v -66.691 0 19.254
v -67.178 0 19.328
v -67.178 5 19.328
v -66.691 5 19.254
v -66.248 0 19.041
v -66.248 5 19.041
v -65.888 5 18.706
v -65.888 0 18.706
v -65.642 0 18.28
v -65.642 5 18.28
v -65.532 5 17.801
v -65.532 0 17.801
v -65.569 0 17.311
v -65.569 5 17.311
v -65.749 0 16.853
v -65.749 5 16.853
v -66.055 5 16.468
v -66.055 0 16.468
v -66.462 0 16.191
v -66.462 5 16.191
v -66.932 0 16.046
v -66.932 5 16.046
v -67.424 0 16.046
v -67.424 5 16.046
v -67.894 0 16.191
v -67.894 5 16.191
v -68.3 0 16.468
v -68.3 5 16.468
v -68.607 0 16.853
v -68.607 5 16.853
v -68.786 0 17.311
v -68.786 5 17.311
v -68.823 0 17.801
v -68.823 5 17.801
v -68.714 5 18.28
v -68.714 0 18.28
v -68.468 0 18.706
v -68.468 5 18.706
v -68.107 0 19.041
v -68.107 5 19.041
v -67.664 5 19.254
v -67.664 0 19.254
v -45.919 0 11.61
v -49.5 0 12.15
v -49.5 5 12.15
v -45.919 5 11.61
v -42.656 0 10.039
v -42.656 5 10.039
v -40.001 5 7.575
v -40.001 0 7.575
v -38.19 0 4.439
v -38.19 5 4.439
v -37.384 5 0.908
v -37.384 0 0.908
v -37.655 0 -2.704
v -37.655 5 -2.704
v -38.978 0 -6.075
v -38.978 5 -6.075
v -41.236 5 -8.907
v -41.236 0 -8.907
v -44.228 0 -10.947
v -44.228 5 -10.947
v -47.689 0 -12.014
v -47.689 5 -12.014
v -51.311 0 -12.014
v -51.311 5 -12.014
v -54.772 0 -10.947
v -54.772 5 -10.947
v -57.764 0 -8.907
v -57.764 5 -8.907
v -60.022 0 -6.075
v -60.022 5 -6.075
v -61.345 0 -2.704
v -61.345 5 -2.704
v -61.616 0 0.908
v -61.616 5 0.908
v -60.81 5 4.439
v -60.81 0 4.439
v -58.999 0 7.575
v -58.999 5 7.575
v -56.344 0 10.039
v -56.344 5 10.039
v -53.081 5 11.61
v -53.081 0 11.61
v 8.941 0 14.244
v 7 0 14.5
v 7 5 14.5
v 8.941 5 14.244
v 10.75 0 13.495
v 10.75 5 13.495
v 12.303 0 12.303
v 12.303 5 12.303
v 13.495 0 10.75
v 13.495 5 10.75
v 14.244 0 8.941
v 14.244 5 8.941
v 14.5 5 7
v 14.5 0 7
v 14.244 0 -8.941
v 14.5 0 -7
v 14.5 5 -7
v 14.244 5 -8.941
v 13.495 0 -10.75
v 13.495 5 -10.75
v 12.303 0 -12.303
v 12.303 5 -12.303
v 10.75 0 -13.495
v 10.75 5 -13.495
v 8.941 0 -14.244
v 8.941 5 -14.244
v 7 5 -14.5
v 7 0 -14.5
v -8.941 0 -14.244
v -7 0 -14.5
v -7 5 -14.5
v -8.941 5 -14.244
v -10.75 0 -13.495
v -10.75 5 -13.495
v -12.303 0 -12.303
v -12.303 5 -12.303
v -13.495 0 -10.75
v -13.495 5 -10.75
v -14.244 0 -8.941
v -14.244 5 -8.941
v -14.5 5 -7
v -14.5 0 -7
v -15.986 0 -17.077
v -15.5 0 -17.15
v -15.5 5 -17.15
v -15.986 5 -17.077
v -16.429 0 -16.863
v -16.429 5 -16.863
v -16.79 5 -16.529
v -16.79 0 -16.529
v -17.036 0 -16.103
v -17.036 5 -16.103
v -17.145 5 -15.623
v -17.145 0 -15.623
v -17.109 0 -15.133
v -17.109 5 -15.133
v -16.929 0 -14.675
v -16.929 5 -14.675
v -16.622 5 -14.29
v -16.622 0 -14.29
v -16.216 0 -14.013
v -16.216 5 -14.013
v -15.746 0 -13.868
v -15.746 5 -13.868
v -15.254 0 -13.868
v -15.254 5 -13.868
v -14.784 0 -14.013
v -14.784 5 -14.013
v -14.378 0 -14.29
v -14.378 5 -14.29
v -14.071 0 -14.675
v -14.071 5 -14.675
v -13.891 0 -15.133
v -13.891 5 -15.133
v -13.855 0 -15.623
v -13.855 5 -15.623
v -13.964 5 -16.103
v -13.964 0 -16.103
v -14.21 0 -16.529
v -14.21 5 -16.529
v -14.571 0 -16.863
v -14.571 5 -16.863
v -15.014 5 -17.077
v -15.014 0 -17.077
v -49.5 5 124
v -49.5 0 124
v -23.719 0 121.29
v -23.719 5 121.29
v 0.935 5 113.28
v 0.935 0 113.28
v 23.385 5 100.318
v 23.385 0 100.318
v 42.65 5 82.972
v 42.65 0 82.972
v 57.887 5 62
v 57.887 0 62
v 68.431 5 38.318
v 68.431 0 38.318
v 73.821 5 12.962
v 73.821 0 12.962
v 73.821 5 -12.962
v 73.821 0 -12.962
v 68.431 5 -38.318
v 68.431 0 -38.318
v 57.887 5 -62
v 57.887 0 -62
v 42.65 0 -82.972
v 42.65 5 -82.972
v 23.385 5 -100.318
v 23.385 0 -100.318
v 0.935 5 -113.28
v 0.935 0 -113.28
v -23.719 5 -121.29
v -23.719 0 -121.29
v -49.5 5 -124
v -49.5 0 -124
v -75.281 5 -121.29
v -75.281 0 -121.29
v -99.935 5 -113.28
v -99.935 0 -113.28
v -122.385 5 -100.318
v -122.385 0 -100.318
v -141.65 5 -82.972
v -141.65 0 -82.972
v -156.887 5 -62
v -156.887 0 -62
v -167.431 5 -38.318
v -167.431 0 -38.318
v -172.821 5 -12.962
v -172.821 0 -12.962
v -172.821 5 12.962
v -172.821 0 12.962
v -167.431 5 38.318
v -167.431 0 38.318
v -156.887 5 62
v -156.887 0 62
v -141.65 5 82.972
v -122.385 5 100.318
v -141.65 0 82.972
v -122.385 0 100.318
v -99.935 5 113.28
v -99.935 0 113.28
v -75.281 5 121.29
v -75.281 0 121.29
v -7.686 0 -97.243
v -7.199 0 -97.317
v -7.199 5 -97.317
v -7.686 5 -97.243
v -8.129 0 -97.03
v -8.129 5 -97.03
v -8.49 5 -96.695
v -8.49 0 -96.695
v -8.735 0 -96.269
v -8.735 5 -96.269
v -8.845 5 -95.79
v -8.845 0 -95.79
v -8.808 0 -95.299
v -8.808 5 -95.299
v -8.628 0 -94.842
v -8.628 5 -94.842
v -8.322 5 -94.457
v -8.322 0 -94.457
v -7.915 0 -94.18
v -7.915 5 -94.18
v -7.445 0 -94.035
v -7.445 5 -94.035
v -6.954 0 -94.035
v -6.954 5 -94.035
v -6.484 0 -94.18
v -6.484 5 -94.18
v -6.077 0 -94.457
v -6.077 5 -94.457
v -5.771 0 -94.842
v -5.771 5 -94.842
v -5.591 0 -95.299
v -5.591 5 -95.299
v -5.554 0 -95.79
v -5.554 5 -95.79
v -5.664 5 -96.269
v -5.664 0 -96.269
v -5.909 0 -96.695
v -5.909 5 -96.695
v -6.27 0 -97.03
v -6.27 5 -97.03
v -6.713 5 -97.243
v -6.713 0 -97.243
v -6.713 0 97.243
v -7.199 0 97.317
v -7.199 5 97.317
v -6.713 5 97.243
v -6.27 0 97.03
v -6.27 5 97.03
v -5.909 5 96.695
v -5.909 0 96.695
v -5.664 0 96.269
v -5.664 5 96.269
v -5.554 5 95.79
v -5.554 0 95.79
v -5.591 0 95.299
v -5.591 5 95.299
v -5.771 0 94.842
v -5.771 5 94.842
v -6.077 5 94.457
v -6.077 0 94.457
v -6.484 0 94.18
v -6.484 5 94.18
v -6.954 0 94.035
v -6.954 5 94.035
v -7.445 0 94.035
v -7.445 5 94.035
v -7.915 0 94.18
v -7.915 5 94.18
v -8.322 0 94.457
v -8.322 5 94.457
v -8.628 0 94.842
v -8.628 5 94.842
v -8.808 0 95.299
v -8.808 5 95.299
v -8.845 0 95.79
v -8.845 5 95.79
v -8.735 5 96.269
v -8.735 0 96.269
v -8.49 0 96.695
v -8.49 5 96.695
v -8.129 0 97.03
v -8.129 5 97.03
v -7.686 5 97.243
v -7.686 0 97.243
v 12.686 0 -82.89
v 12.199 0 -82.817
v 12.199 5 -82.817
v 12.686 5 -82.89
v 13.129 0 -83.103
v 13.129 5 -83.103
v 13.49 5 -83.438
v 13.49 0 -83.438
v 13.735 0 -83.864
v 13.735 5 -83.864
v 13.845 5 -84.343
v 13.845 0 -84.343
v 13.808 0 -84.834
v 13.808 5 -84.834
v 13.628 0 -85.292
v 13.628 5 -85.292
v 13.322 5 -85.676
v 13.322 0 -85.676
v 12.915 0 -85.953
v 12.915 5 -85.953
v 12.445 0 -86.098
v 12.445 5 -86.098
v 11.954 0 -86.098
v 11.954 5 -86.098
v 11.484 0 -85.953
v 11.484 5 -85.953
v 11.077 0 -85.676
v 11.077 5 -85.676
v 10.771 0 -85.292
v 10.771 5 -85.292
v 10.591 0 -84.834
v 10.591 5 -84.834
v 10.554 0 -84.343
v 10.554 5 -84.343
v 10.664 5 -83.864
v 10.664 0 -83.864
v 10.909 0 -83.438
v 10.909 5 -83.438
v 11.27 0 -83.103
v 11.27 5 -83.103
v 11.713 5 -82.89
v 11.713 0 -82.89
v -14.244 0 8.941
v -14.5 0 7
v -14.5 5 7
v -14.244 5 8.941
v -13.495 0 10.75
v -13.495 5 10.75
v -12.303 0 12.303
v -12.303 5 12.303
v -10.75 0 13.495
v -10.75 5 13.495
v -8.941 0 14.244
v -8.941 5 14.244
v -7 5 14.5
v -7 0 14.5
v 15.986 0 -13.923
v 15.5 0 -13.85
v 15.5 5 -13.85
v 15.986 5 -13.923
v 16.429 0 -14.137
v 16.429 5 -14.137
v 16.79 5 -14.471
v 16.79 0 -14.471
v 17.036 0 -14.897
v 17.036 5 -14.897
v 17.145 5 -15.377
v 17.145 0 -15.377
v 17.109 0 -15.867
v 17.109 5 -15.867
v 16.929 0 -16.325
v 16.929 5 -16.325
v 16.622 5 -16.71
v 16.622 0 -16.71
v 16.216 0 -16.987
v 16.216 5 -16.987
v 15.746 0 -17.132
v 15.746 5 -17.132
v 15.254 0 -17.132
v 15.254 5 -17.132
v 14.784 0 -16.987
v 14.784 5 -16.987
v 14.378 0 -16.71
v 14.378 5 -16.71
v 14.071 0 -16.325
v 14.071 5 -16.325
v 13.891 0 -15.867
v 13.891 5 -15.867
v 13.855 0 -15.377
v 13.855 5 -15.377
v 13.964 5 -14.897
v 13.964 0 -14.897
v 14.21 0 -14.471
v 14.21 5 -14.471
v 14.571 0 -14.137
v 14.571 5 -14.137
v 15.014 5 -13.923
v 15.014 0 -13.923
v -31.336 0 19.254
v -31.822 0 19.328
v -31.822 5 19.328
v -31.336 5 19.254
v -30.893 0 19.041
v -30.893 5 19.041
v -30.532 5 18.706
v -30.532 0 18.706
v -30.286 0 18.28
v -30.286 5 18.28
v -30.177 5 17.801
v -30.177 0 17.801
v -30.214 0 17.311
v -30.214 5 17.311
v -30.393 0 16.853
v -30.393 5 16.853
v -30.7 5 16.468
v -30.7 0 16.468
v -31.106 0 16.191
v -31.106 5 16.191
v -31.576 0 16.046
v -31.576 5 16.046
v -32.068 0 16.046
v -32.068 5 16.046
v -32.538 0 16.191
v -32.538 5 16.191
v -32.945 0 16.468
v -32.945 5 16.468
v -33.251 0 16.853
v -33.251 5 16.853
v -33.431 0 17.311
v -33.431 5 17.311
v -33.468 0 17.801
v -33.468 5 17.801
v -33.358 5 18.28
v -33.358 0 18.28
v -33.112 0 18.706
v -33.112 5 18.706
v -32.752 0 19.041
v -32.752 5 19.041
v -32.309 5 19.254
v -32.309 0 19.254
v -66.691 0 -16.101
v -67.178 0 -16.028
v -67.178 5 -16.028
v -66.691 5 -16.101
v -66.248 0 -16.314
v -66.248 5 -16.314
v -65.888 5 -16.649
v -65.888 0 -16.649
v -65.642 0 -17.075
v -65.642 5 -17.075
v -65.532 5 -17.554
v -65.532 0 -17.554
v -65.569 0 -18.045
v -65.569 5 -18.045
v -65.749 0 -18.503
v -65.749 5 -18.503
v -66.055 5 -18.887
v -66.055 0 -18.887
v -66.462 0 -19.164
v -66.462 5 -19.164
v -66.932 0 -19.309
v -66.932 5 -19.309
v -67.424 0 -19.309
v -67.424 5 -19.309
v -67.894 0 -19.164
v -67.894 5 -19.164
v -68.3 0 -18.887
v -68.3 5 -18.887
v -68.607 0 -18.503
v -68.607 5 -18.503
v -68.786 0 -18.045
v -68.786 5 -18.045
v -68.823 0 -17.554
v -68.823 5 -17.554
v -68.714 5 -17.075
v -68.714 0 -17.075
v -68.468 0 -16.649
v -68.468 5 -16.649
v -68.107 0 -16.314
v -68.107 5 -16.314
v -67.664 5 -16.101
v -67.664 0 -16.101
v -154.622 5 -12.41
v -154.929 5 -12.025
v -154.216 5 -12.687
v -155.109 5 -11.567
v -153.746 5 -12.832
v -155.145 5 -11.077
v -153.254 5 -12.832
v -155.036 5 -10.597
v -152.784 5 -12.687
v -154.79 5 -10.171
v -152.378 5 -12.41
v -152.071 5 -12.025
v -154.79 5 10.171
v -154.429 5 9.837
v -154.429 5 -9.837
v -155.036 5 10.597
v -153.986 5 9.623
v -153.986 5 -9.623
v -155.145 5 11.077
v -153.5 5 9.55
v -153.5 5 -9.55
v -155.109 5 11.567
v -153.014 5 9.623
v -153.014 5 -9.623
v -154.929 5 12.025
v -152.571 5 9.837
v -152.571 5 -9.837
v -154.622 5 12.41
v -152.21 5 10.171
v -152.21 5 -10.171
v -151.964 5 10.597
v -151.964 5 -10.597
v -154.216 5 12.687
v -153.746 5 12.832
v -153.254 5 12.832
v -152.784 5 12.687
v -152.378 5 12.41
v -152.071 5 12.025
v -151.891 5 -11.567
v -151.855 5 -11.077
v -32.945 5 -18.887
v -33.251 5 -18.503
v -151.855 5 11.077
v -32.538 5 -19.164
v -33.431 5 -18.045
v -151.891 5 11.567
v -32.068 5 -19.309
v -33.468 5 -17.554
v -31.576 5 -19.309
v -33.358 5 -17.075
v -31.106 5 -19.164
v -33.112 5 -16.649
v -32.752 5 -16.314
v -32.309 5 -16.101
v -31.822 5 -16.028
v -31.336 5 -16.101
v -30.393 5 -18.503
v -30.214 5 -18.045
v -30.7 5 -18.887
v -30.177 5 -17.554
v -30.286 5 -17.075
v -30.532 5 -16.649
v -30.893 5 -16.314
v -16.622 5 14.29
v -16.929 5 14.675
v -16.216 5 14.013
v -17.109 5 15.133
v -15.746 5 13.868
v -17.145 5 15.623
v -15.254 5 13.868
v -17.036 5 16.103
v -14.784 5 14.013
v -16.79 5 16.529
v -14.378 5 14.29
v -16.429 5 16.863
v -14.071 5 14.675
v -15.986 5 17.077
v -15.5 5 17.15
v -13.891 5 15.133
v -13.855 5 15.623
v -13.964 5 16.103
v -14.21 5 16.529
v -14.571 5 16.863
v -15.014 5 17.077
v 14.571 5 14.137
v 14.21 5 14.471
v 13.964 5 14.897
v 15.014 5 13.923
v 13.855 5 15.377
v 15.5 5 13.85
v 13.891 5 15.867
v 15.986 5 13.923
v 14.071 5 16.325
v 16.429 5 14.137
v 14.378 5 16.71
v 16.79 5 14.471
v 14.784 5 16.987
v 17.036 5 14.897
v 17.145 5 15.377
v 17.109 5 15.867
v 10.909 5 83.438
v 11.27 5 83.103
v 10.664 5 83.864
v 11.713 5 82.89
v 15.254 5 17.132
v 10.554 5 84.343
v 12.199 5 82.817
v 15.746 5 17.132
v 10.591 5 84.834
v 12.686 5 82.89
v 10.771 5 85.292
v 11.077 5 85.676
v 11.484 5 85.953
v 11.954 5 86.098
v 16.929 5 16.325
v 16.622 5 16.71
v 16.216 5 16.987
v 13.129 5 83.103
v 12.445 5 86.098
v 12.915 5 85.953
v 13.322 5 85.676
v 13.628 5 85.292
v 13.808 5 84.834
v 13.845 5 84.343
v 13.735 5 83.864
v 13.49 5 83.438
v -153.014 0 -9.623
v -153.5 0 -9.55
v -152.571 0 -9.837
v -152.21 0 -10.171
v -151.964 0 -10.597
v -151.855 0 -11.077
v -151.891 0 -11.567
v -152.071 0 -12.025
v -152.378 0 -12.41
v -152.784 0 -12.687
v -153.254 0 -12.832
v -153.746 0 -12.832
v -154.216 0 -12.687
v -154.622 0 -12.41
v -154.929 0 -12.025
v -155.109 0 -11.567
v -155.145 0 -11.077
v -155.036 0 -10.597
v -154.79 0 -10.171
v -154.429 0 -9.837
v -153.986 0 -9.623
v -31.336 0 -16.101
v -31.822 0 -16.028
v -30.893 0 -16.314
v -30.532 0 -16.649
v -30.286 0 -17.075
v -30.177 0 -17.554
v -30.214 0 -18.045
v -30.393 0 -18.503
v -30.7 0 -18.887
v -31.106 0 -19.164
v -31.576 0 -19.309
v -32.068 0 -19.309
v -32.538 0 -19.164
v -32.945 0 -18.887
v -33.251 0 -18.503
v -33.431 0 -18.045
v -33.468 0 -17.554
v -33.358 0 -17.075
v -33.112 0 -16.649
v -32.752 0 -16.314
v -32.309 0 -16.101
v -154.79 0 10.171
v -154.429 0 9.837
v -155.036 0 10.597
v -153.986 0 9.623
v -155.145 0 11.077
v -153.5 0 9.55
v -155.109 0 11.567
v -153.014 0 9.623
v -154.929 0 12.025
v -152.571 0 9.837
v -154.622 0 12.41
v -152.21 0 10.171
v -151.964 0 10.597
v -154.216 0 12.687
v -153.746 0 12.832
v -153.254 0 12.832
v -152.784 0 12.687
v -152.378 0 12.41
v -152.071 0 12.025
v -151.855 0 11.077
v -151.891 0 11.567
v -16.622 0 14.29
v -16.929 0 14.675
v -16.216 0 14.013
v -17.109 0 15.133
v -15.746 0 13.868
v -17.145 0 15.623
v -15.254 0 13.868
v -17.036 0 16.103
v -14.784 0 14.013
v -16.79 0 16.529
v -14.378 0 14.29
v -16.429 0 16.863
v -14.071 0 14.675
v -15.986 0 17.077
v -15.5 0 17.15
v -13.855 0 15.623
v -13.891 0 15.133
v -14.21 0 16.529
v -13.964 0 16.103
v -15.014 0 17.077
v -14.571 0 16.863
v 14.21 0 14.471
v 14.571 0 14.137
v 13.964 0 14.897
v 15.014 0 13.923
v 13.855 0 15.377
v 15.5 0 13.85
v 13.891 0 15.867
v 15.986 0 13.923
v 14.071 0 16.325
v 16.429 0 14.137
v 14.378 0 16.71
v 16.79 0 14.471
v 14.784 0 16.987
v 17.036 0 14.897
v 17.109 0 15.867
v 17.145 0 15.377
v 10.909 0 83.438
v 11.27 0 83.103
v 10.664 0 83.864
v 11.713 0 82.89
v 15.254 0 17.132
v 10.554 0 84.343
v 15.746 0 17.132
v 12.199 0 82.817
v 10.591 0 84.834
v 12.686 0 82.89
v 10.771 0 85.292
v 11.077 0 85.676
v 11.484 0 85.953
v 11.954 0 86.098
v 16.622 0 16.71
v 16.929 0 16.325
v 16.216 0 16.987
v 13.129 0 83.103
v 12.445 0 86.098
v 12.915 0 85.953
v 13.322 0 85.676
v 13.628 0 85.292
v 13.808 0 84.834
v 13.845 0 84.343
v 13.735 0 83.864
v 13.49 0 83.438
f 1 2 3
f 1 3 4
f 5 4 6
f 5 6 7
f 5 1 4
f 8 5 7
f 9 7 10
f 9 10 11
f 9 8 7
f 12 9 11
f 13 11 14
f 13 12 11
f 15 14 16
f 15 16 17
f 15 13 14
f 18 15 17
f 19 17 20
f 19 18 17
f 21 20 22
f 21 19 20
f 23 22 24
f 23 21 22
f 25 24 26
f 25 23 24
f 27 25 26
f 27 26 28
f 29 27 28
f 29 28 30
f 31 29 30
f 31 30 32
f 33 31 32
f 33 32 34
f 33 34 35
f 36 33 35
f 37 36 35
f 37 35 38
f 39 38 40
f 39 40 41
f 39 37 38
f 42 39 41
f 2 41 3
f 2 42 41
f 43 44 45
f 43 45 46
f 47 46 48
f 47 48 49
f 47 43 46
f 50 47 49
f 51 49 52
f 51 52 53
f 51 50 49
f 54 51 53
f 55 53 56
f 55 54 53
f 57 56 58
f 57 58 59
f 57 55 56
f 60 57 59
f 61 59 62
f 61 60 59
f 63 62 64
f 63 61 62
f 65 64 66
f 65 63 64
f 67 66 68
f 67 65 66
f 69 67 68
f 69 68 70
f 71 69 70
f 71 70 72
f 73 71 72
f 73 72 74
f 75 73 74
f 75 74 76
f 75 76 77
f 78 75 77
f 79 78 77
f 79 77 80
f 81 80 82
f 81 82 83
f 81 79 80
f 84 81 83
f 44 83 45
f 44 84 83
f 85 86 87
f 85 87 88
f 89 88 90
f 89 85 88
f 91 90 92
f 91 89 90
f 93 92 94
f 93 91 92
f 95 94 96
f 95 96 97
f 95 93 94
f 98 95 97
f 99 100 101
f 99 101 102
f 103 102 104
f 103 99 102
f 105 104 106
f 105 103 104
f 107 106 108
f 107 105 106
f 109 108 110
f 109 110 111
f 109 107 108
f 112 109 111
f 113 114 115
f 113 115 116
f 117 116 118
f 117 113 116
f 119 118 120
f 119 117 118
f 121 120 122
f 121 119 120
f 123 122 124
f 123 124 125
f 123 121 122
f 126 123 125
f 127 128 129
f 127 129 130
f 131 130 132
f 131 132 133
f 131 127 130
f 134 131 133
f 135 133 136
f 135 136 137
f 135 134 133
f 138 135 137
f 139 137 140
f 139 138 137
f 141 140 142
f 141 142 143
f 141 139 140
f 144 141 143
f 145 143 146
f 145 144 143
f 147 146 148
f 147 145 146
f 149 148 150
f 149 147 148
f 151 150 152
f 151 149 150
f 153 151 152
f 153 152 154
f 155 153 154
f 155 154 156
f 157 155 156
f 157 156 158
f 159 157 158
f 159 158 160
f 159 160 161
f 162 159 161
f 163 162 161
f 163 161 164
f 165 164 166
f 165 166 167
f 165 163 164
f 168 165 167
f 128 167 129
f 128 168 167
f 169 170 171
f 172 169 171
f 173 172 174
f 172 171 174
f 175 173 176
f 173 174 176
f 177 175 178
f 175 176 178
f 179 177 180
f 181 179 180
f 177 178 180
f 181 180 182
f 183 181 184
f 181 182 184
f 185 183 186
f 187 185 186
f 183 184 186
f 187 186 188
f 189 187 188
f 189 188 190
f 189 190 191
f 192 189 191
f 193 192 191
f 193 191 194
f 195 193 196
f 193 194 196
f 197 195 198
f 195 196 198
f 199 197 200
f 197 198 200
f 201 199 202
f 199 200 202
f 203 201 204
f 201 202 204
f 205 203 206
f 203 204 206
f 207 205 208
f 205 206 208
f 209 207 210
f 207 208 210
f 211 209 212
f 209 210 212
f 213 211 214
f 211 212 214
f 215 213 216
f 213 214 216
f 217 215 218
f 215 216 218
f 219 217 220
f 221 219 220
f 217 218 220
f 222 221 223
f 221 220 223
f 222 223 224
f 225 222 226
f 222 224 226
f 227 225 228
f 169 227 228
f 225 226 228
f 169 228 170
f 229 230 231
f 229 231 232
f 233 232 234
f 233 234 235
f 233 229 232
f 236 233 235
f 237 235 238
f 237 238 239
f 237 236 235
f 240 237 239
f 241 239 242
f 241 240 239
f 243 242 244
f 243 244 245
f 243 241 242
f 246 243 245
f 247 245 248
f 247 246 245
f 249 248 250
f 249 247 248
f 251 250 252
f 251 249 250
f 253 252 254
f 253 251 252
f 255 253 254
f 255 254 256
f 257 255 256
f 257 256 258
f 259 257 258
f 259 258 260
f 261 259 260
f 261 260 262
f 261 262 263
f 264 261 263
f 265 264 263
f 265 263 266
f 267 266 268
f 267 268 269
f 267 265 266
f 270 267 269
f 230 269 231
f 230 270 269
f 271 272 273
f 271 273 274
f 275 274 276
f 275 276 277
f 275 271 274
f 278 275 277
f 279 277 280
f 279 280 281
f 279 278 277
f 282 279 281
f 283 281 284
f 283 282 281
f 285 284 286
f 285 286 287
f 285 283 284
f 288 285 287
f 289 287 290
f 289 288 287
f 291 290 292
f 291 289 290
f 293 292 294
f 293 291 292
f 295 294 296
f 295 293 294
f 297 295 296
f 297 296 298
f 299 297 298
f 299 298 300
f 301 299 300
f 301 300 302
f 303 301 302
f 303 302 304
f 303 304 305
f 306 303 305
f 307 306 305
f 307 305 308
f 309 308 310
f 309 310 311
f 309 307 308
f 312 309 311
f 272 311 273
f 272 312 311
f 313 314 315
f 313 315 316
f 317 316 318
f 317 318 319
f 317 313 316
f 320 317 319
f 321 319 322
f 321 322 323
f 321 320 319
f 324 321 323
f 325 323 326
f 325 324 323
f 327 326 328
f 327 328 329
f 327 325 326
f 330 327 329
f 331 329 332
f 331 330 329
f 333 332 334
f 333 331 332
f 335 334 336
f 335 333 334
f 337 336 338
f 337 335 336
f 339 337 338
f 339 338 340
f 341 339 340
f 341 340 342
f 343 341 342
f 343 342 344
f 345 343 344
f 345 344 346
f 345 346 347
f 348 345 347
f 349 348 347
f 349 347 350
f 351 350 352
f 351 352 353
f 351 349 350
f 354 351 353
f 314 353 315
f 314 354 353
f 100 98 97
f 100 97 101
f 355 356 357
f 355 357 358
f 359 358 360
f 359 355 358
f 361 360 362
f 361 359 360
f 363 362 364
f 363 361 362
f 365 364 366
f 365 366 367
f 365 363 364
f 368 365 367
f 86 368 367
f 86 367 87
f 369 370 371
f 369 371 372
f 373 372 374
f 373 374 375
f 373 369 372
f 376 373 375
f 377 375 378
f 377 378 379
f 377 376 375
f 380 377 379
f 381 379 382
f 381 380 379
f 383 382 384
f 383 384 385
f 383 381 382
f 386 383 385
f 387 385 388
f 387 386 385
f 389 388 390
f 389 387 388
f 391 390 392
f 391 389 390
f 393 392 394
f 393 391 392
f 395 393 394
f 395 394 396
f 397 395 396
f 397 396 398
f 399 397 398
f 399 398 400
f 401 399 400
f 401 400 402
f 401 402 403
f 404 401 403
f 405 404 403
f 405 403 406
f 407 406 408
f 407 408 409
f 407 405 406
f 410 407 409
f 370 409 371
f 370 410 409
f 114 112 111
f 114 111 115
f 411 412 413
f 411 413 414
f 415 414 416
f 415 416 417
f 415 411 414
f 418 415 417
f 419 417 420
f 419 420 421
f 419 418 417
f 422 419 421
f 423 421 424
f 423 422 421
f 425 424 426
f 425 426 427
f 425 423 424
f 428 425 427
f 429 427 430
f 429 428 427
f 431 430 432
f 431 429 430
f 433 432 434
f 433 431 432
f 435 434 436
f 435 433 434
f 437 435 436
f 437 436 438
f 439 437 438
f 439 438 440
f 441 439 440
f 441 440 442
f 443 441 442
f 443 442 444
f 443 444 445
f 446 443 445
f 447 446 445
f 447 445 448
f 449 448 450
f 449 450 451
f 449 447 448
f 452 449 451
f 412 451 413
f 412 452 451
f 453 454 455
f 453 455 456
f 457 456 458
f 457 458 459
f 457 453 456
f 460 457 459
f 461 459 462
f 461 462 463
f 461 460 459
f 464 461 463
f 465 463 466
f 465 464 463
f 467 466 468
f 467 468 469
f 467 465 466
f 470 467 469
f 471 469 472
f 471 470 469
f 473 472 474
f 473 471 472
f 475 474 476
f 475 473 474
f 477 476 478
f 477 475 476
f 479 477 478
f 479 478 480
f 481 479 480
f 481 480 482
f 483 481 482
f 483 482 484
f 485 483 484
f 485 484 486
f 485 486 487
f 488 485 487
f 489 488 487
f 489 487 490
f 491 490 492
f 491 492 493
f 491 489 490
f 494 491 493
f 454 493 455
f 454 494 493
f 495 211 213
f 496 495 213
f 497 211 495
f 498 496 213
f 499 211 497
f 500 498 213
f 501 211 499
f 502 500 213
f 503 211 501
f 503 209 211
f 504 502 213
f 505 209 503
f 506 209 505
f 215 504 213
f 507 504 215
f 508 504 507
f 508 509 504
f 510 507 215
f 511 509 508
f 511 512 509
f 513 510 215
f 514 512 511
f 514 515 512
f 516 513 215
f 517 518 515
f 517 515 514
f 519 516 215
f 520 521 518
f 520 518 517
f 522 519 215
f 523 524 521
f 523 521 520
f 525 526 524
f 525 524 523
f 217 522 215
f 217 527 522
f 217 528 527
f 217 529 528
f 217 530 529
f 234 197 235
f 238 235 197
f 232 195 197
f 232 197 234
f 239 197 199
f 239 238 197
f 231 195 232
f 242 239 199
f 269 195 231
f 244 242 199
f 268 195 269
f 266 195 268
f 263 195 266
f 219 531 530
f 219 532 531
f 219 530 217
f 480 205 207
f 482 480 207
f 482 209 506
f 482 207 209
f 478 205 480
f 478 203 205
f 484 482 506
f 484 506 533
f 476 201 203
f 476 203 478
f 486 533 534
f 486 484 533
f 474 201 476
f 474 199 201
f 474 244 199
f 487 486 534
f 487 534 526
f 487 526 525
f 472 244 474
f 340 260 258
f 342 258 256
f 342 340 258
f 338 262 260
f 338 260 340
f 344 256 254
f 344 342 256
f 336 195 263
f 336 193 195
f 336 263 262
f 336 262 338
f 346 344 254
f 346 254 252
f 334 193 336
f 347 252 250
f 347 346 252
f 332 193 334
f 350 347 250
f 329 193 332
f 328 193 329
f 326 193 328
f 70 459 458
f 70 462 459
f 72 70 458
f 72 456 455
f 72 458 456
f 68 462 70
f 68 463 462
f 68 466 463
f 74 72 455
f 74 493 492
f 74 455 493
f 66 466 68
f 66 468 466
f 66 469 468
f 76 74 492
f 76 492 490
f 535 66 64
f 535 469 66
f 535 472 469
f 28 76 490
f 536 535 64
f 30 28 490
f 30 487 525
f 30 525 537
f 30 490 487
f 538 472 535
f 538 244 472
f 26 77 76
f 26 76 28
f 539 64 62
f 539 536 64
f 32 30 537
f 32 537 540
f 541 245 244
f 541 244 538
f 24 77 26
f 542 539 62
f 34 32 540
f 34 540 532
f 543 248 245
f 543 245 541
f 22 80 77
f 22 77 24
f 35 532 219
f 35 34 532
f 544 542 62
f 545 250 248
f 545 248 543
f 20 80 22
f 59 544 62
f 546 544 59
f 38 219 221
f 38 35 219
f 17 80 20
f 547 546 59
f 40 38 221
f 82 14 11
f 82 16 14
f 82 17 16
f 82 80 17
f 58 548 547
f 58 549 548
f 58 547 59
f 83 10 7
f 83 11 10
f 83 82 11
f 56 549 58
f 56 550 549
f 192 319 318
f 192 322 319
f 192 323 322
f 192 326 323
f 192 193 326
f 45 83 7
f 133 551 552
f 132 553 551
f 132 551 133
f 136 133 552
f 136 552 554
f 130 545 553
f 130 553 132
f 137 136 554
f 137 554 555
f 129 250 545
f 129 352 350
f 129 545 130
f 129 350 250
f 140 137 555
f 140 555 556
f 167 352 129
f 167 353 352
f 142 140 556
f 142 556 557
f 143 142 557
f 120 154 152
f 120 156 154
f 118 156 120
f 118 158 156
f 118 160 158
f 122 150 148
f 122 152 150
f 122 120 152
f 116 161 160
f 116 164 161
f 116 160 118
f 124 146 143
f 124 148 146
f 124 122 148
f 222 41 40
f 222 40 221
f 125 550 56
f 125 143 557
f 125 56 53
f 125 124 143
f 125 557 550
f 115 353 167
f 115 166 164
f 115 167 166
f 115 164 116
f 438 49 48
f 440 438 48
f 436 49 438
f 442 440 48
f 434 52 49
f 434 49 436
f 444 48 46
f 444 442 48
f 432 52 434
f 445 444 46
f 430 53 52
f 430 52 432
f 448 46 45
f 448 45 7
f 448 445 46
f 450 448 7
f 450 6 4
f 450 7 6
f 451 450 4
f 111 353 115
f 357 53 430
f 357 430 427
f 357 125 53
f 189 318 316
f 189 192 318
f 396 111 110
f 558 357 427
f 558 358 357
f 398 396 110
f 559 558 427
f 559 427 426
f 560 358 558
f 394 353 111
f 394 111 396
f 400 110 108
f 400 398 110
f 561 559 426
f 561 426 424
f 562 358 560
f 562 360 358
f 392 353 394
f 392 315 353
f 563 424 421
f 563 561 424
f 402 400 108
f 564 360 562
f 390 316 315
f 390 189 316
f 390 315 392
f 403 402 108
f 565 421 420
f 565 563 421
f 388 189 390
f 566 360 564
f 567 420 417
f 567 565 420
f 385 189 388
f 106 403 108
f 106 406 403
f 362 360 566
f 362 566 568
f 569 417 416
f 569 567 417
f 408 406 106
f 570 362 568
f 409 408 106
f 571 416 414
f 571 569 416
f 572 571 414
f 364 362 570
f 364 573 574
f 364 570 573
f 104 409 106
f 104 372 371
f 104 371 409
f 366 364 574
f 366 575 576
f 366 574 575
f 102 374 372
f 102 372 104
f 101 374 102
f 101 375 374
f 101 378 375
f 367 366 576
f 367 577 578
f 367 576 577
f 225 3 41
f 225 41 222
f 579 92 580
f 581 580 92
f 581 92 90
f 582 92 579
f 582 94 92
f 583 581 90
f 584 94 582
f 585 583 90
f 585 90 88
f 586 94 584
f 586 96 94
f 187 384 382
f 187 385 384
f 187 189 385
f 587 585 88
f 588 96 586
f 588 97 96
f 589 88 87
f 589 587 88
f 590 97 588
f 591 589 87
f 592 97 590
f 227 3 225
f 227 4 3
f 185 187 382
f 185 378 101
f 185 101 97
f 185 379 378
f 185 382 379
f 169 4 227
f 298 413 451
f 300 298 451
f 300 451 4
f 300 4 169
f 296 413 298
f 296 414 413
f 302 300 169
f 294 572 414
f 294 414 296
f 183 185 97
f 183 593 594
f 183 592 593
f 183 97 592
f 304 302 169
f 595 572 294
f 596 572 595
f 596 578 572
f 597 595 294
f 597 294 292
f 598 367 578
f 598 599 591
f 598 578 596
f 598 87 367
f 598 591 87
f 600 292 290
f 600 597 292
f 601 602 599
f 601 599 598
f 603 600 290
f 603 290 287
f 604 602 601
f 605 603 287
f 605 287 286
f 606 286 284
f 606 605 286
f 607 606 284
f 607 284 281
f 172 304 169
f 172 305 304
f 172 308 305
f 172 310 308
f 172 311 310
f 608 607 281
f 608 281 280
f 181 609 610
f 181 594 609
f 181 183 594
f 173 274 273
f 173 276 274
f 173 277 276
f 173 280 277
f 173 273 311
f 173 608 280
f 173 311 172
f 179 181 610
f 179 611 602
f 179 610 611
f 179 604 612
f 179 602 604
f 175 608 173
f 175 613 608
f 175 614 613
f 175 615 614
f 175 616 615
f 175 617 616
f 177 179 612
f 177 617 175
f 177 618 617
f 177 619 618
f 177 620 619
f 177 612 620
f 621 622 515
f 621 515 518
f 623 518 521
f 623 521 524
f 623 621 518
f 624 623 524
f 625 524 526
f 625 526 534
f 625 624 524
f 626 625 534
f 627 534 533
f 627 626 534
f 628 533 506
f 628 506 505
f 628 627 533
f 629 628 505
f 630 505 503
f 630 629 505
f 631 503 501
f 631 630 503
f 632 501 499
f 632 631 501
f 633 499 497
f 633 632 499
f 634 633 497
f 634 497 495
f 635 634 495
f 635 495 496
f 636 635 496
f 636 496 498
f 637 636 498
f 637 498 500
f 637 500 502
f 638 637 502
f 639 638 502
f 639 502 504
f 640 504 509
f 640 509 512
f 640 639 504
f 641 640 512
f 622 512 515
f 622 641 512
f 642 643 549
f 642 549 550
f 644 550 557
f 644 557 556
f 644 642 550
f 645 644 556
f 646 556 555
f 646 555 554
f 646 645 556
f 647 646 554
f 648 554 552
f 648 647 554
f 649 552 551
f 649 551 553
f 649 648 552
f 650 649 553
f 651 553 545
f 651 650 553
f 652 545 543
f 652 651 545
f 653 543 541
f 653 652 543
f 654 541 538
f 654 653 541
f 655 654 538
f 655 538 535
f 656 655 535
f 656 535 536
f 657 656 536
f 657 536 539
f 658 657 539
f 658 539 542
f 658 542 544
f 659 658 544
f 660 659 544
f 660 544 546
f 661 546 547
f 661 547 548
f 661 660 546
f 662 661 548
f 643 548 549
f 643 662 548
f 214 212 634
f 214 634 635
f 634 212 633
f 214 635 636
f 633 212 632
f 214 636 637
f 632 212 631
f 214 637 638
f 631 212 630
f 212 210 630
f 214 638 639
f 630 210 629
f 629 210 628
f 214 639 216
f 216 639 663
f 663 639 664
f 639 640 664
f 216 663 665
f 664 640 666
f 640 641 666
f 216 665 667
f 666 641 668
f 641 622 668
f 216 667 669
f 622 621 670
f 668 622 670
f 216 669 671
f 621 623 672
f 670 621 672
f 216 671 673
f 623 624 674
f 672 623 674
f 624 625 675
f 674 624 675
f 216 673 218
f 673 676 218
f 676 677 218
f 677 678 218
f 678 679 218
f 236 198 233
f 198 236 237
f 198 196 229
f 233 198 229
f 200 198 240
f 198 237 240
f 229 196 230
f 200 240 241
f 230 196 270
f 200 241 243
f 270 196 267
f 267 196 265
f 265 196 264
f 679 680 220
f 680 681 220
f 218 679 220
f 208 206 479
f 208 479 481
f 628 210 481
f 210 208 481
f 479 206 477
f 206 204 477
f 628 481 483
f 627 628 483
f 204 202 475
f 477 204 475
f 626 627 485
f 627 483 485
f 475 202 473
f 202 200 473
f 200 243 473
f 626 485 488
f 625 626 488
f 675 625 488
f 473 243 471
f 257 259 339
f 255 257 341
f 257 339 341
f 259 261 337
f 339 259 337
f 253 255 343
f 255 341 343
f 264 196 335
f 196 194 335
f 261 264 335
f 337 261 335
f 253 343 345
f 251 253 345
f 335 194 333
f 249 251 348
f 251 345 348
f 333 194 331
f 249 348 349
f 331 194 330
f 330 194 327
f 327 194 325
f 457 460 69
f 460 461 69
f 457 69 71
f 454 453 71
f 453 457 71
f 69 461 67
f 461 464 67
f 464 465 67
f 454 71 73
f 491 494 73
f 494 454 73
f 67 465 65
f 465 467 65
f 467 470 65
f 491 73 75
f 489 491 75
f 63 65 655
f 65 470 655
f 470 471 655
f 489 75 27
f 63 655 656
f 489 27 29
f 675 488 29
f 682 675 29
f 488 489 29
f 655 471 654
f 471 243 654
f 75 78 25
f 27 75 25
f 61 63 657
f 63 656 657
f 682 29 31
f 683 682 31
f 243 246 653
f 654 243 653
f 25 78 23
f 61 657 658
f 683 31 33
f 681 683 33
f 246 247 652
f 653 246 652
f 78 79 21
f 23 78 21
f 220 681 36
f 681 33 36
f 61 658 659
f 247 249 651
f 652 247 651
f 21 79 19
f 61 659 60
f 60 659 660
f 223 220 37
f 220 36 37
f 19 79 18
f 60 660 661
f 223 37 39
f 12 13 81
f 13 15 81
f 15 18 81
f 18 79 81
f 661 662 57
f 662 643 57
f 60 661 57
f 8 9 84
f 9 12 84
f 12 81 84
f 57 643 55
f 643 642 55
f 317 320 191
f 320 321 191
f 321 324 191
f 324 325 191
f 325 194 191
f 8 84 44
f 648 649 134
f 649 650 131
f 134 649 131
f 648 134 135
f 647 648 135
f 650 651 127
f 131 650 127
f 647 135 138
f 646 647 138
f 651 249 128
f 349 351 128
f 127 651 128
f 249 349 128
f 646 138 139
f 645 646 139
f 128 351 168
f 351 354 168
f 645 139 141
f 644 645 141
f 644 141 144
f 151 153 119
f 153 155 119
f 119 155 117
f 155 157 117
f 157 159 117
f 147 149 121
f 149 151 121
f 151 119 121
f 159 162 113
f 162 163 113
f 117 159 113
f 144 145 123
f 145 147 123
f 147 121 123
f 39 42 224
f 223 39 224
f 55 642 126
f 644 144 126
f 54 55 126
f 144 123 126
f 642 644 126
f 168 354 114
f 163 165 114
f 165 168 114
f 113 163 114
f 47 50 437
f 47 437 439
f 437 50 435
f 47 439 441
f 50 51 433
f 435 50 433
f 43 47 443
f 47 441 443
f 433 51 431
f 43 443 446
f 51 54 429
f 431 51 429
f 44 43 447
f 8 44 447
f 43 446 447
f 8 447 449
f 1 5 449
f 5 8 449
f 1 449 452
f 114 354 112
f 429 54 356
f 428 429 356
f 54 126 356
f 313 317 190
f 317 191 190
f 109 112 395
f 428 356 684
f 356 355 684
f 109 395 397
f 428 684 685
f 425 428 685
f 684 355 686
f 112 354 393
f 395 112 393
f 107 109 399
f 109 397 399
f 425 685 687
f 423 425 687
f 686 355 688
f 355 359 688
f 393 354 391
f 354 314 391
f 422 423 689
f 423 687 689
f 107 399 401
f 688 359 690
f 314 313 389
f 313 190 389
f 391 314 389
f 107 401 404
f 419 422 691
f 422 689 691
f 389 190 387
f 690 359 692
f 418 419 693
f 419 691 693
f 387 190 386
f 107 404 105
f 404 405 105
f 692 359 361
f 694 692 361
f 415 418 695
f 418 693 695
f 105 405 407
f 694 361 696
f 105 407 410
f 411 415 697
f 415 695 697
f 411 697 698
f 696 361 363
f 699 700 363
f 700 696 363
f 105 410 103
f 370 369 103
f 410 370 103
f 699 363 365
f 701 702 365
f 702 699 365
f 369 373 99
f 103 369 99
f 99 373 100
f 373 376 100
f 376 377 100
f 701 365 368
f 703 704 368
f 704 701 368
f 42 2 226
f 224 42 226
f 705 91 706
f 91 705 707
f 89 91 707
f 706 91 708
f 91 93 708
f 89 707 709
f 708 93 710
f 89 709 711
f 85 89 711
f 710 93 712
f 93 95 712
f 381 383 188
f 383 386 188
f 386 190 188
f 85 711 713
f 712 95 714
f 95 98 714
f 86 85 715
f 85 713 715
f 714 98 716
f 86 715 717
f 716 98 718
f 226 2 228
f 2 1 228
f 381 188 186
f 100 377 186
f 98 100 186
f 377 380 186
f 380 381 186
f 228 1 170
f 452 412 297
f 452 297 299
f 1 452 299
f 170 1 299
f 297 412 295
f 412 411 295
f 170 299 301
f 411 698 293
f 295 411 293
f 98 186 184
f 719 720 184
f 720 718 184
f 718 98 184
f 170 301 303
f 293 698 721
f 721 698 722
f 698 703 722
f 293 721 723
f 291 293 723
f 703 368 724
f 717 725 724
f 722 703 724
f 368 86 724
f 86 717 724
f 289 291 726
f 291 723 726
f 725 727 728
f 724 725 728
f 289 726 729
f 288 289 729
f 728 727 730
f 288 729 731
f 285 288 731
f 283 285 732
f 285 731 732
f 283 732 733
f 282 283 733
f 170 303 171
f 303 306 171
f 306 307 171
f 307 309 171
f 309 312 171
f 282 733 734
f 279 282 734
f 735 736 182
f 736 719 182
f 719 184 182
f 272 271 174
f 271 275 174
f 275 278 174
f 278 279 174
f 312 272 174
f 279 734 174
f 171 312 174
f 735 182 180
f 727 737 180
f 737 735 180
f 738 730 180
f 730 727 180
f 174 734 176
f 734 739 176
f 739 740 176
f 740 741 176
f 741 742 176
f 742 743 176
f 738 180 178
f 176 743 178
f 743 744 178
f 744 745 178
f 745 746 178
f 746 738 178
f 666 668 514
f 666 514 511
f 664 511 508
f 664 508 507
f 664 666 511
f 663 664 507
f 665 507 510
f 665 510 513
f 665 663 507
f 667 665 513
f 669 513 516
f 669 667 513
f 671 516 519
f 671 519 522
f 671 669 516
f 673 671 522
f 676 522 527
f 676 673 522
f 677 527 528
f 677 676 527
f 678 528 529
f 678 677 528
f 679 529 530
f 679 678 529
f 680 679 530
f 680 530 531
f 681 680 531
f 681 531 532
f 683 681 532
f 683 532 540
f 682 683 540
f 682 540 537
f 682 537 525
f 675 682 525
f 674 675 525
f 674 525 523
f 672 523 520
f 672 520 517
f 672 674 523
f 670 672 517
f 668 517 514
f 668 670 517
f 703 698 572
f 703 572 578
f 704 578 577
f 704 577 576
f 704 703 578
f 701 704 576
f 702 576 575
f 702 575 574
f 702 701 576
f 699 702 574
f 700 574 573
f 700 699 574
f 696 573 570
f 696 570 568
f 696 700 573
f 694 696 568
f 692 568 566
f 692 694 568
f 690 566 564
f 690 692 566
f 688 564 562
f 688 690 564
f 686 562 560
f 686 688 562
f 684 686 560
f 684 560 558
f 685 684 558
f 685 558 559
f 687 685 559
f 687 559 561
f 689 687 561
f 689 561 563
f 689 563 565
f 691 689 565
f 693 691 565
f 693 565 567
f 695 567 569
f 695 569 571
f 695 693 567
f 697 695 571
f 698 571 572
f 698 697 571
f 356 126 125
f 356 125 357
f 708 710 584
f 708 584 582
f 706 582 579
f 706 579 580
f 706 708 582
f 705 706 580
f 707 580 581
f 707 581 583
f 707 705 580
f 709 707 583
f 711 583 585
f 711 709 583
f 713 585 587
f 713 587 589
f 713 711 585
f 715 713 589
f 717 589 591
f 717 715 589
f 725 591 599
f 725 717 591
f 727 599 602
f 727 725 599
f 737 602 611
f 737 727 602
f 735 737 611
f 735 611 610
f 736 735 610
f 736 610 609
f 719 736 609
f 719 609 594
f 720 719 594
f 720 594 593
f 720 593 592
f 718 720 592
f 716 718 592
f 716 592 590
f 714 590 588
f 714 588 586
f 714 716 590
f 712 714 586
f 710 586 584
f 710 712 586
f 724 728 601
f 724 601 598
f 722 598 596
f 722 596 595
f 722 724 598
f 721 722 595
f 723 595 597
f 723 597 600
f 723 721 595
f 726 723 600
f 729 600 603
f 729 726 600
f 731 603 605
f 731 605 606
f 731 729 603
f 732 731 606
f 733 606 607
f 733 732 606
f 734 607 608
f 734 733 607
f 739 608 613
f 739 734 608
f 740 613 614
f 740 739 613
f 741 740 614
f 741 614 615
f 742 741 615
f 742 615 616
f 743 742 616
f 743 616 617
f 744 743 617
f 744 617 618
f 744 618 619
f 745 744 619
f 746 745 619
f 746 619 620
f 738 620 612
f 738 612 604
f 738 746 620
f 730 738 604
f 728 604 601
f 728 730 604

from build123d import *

# Parameters (mm, degrees)
LASER_HOLES_R       = 124
LASER_HOLES_R_2     = 1.65
LASER_HOLES_R_3     = 12.15
BOSS_EXTRUDE4_DEPTH = 5


with BuildPart() as part:
    # Laser holes → Boss-Extrude4 (new body)
    with BuildSketch(Plane(origin=(0, 0, 0), x_dir=(1, 0, 0), z_dir=(0, 1, 0))):
        with Locations(Location((-49.5, 0, 0), (0, 0, 270))):
            Circle(LASER_HOLES_R)
        with Locations(Location((15.5, 15.5, 0), (0, 0, 270))):
            Circle(LASER_HOLES_R_2, mode=Mode.SUBTRACT)
        with Locations(Location((-15.5, 15.5, 0), (0, 0, 90))):
            Circle(LASER_HOLES_R_2, mode=Mode.SUBTRACT)
        with Locations(Location((-15.5, -15.5, 0), (0, 0, 270))):
            Circle(LASER_HOLES_R_2, mode=Mode.SUBTRACT)
        with Locations(Location((15.5, -15.5, 0), (0, 0, 90))):
            Circle(LASER_HOLES_R_2, mode=Mode.SUBTRACT)
        with Locations(Location((-31.82233047, 17.67766953, 0), (0, 0, 270))):
            Circle(LASER_HOLES_R_2, mode=Mode.SUBTRACT)
        with Locations(Location((-67.17766953, 17.67766953, 0), (0, 0, 270))):
            Circle(LASER_HOLES_R_2, mode=Mode.SUBTRACT)
        with Locations(Location((-67.17766953, -17.67766953, 0), (0, 0, 270))):
            Circle(LASER_HOLES_R_2, mode=Mode.SUBTRACT)
        with Locations(Location((-31.82233047, -17.67766953, 0), (0, 0, 270))):
            Circle(LASER_HOLES_R_2, mode=Mode.SUBTRACT)
        with Locations(Location((-49.5, 0, 0), (0, 0, 270))):
            Circle(LASER_HOLES_R_3, mode=Mode.SUBTRACT)
        with Locations(Location((-153.5, 11.2, 0), (0, 0, 270))):
            Circle(LASER_HOLES_R_2, mode=Mode.SUBTRACT)
        with Locations(Location((-153.5, -11.2, 0), (0, 0, 90))):
            Circle(LASER_HOLES_R_2, mode=Mode.SUBTRACT)
        with Locations(Location((-7.199484522, 95.666641994, 0), (0, 0, 90))):
            Circle(LASER_HOLES_R_2, mode=Mode.SUBTRACT)
        with Locations(Location((12.199484522, 84.466641994, 0), (0, 0, 270))):
            Circle(LASER_HOLES_R_2, mode=Mode.SUBTRACT)
        with Locations(Location((12.199484522, -84.466641994, 0), (0, 0, 90))):
            Circle(LASER_HOLES_R_2, mode=Mode.SUBTRACT)
        with Locations(Location((-7.199484522, -95.666641994, 0), (0, 0, 270))):
            Circle(LASER_HOLES_R_2, mode=Mode.SUBTRACT)
        with BuildLine():
            Line((14.5, -7), (14.5, 7))
            ThreePointArc((14.5, 7), (12.303300859, 12.303300859), (7, 14.5))
            Line((7, 14.5), (-7, 14.5))
            ThreePointArc((-7, 14.5), (-12.303300859, 12.303300859), (-14.5, 7))
            Line((-14.5, 7), (-14.5, -7))
            ThreePointArc((-14.5, -7), (-12.303300859, -12.303300859), (-7, -14.5))
            Line((-7, -14.5), (7, -14.5))
            ThreePointArc((7, -14.5), (12.303300859, -12.303300859), (14.5, -7))
        make_face(mode=Mode.SUBTRACT)
    extrude(amount=BOSS_EXTRUDE4_DEPTH)


solid = part.part
